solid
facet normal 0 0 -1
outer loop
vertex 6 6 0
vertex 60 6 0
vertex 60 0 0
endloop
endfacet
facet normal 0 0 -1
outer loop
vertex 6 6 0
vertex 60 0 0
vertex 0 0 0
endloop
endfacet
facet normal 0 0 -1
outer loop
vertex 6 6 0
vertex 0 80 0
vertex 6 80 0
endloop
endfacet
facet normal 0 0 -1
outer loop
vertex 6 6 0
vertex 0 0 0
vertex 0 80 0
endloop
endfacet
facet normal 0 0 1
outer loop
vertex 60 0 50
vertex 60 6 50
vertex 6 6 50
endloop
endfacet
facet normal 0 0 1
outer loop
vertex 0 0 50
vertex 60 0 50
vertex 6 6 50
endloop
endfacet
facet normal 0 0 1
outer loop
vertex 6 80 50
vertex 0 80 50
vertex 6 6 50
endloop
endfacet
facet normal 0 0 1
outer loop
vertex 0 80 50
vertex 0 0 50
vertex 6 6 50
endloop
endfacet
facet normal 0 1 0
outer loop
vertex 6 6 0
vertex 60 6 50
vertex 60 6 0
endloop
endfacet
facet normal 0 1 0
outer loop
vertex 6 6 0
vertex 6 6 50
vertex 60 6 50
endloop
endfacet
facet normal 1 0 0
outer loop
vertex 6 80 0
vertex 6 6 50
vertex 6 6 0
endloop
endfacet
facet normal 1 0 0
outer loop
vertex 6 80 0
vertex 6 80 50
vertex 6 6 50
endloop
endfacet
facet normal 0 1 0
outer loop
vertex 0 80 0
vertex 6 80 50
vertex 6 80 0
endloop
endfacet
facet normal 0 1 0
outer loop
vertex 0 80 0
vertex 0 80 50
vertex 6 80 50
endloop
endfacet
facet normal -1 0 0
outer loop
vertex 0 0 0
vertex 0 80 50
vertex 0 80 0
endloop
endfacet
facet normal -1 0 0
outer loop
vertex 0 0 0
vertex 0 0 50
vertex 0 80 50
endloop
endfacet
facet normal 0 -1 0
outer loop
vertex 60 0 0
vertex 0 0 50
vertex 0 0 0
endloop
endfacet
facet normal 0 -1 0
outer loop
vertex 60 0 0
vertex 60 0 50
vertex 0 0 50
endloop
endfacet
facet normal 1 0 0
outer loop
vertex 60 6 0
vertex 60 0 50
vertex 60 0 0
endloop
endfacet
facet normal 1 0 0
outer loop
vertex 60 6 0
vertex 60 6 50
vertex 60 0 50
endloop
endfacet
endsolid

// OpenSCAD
$fn = 32;

// ----------------------------------------------------------------------
// Structural section: angle 60 x 80 mm
// ----------------------------------------------------------------------

// --- parameters (mm) ---
sec_w = 60;               // leg width, X
sec_h = 80;               // leg height, Y
flange_t = 6;             // leg thickness
plate_t = 50;             // cut length, Z (extrusion height)

profile = [[0, 0], [60, 0], [60, 6], [6, 6], [6, 80], [0, 80]];  // primary outline, 6 points, counter clockwise

// --- the one profile operation ---
linear_extrude(height = plate_t) polygon(points = profile);
